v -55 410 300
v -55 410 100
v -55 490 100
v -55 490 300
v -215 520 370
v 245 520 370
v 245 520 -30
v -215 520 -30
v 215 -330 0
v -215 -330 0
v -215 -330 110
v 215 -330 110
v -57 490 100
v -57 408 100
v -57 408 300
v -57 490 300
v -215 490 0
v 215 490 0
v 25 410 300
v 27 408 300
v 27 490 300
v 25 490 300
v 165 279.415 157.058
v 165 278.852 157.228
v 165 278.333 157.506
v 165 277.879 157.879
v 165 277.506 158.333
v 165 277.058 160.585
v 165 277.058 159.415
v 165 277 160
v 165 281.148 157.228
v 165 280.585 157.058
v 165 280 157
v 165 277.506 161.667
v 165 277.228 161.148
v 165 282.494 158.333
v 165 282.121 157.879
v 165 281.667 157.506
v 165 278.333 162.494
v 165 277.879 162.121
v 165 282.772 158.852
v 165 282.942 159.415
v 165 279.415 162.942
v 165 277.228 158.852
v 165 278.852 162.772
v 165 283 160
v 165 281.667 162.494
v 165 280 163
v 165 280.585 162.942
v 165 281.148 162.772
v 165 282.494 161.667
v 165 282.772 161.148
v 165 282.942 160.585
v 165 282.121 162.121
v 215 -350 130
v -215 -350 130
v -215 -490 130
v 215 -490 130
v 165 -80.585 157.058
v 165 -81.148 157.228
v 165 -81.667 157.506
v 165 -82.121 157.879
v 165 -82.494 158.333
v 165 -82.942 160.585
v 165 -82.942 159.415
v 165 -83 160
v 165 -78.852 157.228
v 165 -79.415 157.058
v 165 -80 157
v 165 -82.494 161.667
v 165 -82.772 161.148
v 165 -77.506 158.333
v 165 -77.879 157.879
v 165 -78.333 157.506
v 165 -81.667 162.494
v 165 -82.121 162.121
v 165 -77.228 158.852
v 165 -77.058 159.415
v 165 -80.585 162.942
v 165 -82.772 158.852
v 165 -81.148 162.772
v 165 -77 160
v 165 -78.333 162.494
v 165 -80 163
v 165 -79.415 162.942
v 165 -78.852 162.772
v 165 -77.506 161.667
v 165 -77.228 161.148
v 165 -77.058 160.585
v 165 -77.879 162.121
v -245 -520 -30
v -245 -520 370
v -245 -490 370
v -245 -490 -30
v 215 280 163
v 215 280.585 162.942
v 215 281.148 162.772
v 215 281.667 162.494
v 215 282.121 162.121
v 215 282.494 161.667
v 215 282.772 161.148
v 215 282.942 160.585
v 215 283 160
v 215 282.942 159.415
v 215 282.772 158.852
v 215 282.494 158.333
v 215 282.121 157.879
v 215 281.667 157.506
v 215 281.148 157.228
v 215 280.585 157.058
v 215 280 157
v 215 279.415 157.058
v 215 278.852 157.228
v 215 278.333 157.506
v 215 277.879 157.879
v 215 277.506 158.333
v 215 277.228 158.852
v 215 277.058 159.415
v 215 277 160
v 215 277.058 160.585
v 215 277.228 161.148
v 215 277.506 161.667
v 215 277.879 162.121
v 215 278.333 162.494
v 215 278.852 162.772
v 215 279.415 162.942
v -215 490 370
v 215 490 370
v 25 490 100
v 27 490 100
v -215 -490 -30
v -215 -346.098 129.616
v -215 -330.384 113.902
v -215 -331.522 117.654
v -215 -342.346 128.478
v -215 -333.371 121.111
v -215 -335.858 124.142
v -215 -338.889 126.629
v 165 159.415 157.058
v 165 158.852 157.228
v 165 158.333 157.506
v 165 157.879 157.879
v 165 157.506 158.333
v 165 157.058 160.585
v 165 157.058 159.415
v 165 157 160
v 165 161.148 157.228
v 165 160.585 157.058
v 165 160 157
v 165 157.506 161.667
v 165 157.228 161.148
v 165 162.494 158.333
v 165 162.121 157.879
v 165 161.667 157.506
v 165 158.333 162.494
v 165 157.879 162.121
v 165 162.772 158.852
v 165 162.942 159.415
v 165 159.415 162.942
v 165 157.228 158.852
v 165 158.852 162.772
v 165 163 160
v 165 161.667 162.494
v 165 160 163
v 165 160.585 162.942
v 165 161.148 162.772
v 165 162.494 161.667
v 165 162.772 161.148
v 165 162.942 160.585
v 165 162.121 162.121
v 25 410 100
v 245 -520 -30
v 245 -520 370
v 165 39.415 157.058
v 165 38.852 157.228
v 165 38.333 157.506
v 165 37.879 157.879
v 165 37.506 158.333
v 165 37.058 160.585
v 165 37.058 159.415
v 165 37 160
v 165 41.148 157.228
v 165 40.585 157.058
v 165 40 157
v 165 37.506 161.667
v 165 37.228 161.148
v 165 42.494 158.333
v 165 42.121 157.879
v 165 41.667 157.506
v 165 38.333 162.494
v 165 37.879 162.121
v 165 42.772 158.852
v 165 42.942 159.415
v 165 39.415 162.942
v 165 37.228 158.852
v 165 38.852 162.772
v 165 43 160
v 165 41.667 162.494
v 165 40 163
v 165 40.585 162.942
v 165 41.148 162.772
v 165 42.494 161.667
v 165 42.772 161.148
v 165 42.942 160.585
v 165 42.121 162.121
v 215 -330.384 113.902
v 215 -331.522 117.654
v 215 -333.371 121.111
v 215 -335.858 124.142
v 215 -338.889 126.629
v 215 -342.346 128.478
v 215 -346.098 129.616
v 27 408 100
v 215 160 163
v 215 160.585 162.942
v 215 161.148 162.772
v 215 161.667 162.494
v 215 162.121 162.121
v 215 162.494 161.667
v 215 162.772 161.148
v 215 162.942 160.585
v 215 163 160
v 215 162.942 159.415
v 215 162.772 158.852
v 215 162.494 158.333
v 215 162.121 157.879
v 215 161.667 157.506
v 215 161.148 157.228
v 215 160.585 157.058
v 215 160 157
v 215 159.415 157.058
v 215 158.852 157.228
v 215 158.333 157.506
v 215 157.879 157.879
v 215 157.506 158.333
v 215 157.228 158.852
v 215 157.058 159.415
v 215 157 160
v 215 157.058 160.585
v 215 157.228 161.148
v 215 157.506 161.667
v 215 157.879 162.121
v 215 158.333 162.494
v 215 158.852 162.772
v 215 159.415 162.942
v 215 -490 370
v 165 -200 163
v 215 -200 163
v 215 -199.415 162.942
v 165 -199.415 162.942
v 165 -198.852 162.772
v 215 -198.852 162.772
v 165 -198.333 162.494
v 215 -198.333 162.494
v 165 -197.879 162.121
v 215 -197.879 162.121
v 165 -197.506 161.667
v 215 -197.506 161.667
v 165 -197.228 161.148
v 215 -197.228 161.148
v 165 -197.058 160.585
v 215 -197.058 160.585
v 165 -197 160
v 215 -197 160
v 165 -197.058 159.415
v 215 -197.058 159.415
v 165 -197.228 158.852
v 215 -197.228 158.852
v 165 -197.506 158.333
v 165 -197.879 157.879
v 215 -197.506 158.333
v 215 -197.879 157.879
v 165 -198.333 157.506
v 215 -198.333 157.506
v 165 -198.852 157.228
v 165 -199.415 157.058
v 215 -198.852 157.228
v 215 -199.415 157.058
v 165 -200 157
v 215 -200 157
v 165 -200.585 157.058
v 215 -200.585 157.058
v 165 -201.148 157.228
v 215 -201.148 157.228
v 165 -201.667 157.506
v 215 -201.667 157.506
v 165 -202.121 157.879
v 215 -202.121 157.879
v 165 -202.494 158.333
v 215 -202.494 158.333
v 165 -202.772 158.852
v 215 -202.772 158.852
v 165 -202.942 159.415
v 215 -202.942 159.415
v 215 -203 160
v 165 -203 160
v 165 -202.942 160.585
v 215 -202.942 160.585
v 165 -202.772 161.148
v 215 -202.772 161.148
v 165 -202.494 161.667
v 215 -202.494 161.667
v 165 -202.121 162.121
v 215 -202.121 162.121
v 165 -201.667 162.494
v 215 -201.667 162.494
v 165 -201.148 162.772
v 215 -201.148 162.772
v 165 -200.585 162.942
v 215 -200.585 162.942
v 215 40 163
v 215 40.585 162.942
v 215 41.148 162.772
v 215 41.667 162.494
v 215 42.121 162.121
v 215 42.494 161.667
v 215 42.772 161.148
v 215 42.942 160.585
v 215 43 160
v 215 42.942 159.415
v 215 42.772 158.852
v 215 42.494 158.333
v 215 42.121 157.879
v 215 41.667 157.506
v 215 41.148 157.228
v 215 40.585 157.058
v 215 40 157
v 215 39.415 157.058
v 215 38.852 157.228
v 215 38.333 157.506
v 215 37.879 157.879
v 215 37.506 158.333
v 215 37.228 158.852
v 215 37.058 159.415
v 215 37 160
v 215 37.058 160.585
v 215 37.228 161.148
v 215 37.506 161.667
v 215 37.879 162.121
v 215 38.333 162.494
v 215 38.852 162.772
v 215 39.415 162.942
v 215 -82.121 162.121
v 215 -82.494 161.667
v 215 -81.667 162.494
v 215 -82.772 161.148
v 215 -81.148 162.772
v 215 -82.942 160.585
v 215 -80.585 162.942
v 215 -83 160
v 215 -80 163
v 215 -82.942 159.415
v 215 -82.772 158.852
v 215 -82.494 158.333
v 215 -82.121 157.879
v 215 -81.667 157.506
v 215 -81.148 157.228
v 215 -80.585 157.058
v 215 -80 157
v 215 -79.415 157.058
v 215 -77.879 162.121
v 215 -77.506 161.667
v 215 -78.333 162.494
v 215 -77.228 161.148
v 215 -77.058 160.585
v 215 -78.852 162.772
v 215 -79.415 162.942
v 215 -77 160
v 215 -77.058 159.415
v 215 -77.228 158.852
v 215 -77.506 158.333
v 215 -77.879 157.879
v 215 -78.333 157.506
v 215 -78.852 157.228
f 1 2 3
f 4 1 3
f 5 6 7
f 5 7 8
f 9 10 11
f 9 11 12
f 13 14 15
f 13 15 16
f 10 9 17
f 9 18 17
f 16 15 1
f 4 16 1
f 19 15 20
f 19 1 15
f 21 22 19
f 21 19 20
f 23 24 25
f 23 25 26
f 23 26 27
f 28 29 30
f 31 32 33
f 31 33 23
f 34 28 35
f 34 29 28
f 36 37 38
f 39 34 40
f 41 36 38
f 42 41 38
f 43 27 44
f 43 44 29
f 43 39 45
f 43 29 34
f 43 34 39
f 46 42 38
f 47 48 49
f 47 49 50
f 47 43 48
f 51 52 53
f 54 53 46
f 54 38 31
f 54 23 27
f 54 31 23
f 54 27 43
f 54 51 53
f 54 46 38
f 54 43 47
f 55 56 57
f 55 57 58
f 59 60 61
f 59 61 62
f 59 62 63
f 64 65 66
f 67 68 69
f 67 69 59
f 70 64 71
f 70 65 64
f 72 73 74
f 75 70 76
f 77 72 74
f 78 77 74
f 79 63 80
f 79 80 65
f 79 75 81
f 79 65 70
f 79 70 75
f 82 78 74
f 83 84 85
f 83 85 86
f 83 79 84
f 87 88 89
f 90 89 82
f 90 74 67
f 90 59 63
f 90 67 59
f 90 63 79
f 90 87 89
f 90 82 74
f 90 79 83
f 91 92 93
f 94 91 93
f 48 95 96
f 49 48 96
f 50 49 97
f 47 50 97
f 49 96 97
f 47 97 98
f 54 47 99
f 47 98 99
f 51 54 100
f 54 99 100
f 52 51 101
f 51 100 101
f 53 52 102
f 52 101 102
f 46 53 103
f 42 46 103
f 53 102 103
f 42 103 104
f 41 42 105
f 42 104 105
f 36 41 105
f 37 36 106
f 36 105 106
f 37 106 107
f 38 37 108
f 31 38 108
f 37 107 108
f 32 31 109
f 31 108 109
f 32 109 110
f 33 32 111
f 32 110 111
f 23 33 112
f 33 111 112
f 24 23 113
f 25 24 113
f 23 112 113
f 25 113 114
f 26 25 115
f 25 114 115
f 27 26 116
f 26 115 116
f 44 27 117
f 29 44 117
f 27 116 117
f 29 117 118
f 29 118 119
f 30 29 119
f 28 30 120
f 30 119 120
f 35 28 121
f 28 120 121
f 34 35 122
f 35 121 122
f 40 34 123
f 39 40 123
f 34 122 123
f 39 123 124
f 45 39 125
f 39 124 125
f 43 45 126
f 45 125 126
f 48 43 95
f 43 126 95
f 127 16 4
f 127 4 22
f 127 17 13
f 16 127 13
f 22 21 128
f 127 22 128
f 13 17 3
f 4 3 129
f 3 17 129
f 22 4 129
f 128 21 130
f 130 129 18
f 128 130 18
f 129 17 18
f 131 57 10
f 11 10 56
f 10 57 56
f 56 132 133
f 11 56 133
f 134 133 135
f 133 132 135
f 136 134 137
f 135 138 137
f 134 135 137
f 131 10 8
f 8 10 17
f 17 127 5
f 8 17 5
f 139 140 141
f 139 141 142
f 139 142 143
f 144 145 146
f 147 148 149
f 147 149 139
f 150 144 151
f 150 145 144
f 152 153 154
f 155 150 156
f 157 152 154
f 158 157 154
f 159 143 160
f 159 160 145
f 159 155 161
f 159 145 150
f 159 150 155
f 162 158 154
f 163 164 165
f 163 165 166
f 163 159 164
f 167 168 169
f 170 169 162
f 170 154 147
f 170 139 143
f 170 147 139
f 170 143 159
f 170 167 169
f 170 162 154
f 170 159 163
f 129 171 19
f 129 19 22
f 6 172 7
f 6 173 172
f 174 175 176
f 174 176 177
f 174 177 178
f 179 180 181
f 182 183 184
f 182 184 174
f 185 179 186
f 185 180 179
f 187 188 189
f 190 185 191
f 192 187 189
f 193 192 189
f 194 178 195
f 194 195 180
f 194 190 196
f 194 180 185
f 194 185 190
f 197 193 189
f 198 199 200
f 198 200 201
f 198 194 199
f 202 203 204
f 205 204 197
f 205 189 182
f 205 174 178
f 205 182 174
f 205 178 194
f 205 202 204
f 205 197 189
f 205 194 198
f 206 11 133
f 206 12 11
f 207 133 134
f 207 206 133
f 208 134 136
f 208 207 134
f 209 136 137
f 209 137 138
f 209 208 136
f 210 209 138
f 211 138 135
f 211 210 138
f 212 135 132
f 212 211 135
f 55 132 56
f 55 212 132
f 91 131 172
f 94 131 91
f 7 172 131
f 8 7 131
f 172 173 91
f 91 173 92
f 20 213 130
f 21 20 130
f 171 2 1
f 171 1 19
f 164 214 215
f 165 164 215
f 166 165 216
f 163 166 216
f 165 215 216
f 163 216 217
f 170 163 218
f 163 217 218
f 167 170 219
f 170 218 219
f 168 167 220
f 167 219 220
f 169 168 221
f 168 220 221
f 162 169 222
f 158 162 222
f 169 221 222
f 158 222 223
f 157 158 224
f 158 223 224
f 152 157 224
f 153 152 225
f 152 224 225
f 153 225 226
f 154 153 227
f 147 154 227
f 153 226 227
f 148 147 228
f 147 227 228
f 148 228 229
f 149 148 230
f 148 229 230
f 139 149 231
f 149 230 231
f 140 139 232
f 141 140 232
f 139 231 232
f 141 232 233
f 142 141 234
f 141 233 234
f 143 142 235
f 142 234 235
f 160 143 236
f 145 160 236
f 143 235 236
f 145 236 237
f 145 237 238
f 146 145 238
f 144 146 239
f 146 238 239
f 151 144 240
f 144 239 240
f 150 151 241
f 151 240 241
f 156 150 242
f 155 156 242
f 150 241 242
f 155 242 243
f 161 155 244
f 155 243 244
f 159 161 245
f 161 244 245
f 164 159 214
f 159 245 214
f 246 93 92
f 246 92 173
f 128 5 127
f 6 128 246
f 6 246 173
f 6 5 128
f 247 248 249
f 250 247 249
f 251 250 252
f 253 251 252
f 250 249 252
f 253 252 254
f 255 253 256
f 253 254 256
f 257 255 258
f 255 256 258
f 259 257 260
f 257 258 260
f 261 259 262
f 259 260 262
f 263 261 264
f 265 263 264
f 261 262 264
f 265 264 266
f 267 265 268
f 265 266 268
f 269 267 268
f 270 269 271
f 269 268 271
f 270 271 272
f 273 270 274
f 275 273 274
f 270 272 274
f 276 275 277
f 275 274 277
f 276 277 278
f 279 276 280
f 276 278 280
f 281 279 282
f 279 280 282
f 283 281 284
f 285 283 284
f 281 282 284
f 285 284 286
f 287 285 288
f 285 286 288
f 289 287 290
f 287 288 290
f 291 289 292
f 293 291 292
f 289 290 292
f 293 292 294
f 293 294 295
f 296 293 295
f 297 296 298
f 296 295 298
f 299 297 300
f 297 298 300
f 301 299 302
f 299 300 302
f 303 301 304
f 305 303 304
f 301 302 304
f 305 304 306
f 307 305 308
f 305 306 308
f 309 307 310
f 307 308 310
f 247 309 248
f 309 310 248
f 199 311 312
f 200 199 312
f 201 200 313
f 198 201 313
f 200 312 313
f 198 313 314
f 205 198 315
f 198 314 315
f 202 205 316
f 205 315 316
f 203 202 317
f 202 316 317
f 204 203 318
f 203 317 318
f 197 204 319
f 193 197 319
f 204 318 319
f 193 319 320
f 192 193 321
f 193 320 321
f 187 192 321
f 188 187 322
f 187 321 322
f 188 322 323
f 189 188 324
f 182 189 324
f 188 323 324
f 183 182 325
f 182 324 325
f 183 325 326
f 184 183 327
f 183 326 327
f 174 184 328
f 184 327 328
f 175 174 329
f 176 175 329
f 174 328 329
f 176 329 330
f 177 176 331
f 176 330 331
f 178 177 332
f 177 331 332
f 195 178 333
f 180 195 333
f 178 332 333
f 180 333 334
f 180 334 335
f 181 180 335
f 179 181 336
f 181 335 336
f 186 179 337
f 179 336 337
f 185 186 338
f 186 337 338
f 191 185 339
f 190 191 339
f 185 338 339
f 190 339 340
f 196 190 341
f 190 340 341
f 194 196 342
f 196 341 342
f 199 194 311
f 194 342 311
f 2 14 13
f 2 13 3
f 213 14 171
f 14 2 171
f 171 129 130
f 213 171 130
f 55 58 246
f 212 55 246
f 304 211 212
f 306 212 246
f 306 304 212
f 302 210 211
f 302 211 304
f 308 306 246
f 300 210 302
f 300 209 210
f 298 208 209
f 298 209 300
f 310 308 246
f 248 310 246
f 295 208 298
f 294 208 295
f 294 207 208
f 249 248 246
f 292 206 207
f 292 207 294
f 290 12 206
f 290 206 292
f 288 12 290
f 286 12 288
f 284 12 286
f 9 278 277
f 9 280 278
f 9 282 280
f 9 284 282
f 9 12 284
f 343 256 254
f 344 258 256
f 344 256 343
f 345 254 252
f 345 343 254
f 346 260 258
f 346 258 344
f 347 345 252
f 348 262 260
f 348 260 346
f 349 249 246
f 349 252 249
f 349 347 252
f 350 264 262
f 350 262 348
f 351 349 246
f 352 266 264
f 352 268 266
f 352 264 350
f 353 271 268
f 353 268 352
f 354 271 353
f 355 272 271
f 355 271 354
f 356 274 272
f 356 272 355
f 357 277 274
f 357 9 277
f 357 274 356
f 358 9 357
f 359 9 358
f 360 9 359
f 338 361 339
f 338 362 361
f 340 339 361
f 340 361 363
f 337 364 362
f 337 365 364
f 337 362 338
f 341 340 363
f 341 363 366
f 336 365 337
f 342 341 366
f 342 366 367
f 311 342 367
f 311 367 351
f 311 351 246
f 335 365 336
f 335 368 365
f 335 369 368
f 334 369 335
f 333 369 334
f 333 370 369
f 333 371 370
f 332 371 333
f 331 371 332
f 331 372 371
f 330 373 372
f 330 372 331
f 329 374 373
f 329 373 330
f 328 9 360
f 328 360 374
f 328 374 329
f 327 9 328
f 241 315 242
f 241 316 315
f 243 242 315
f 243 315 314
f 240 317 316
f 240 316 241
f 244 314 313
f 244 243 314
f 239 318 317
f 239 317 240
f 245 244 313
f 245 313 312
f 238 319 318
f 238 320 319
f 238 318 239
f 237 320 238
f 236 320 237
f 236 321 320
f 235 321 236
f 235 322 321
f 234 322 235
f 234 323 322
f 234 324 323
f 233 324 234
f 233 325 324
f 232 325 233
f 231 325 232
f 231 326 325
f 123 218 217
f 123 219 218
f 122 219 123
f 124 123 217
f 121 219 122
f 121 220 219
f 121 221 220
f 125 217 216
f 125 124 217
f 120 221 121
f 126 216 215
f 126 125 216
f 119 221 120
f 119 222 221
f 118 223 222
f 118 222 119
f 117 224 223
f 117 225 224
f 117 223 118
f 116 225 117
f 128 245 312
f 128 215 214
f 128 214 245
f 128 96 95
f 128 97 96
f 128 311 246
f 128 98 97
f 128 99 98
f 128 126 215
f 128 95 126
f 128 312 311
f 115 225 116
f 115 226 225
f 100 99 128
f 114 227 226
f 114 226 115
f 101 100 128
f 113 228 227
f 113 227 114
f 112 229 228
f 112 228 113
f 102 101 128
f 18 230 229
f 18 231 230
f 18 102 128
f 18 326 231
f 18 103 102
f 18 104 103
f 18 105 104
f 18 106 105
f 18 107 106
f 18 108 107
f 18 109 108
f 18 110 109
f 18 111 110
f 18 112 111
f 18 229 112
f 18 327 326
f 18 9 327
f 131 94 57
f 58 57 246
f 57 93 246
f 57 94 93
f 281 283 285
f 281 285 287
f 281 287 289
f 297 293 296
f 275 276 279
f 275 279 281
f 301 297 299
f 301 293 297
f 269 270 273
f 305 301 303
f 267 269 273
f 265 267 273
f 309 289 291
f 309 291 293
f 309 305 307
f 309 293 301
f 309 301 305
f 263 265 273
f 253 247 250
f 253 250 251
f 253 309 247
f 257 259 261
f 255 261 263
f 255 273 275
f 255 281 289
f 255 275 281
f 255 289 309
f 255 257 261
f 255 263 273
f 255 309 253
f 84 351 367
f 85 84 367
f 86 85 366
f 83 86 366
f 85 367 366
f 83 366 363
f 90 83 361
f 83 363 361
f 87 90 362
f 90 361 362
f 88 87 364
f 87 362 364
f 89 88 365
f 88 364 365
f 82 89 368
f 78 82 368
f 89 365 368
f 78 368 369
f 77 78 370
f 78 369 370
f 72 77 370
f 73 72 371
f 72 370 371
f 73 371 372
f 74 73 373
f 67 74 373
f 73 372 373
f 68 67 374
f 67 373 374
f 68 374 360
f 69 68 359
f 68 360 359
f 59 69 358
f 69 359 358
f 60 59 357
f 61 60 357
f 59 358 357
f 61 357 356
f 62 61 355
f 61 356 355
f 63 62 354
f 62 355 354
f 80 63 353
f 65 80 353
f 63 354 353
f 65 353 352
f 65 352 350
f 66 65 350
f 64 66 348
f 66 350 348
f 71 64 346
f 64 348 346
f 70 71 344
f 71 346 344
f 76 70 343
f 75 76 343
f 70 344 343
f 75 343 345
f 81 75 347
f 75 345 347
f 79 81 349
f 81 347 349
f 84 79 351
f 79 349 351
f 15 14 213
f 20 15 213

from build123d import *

# Parameters (mm, degrees)
SKETCH1_W           = 490
SKETCH1_H           = 1040
SKETCH1_W_2         = 430
SKETCH1_H_2         = 980
BOSS_EXTRUDE1_DEPTH = 370
SKETCH2_W           = 490
SKETCH2_H           = 1040
BOSS_EXTRUDE2_DEPTH = 30
SKETCH3_W           = 430
SKETCH3_H           = 160
BOSS_EXTRUDE3_DEPTH = 130
FILLET1_R           = 20
SKETCH5_W           = 30
SKETCH5_H           = 1010
CUT_EXTRUDE2_DEPTH  = 400
SKETCH7_R           = 3
BOSS_EXTRUDE4_DEPTH = 50
SKETCH8_W           = 84
SKETCH8_H           = 84
SKETCH8_W_2         = 80
SKETCH8_H_2         = 80
BOSS_EXTRUDE5_DEPTH = 300
SKETCH9_W           = 84
SKETCH9_H           = 82
CUT_EXTRUDE3_DEPTH  = 100


with BuildPart() as part:
    # Sketch1 → Boss-Extrude1 (new body)
    with BuildSketch(Plane.XY):
        Rectangle(SKETCH1_W, SKETCH1_H)
        Rectangle(SKETCH1_W_2, SKETCH1_H_2, mode=Mode.SUBTRACT)
    extrude(amount=BOSS_EXTRUDE1_DEPTH)

    # Sketch2 → Boss-Extrude2 (add)
    with BuildSketch(Plane(origin=(0, 0, 0), x_dir=(-1, 0, 0), z_dir=(0, 0, -1))):
        Rectangle(SKETCH2_W, SKETCH2_H)
    extrude(amount=BOSS_EXTRUDE2_DEPTH)

    # Sketch3 → Boss-Extrude3 (add)
    with BuildSketch(Plane.XY):
        with Locations((0, -410)):
            Rectangle(SKETCH3_W, SKETCH3_H)
    extrude(amount=BOSS_EXTRUDE3_DEPTH)

    # Fillet1
    fillet1_edges = [part.edges().sort_by_distance(p)[0] for p in [
        (0, -330, 130),
    ]]
    fillet(fillet1_edges, radius=FILLET1_R)

    # Sketch5 → Cut-Extrude2 (cut)
    with BuildSketch(Plane.XY.offset(370)):
        with Locations((-230, 15)):
            Rectangle(SKETCH5_W, SKETCH5_H)
    extrude(amount=-CUT_EXTRUDE2_DEPTH, mode=Mode.SUBTRACT)

    # Sketch7 → Boss-Extrude4 (add)
    with BuildSketch(Plane.ZY.offset(-215)):
        with Locations((160, 280)):
            Circle(SKETCH7_R)
        with Locations((160, 160)):
            Circle(SKETCH7_R)
        with Locations((160, 40)):
            Circle(SKETCH7_R)
        with Locations((160, -80)):
            Circle(SKETCH7_R)
        with Locations((160, -200)):
            Circle(SKETCH7_R)
    extrude(amount=BOSS_EXTRUDE4_DEPTH)

    # Sketch8 → Boss-Extrude5 (add)
    with BuildSketch(Plane.XY):
        with Locations((-15, 450)):
            Rectangle(SKETCH8_W, SKETCH8_H)
        with Locations((-15, 450)):
            Rectangle(SKETCH8_W_2, SKETCH8_H_2, mode=Mode.SUBTRACT)
    extrude(amount=BOSS_EXTRUDE5_DEPTH)

    # Sketch9 → Cut-Extrude3 (cut)
    with BuildSketch(Plane.XY):
        with Locations((-15, 449)):
            Rectangle(SKETCH9_W, SKETCH9_H)
    extrude(amount=CUT_EXTRUDE3_DEPTH, mode=Mode.SUBTRACT)


solid = part.part
